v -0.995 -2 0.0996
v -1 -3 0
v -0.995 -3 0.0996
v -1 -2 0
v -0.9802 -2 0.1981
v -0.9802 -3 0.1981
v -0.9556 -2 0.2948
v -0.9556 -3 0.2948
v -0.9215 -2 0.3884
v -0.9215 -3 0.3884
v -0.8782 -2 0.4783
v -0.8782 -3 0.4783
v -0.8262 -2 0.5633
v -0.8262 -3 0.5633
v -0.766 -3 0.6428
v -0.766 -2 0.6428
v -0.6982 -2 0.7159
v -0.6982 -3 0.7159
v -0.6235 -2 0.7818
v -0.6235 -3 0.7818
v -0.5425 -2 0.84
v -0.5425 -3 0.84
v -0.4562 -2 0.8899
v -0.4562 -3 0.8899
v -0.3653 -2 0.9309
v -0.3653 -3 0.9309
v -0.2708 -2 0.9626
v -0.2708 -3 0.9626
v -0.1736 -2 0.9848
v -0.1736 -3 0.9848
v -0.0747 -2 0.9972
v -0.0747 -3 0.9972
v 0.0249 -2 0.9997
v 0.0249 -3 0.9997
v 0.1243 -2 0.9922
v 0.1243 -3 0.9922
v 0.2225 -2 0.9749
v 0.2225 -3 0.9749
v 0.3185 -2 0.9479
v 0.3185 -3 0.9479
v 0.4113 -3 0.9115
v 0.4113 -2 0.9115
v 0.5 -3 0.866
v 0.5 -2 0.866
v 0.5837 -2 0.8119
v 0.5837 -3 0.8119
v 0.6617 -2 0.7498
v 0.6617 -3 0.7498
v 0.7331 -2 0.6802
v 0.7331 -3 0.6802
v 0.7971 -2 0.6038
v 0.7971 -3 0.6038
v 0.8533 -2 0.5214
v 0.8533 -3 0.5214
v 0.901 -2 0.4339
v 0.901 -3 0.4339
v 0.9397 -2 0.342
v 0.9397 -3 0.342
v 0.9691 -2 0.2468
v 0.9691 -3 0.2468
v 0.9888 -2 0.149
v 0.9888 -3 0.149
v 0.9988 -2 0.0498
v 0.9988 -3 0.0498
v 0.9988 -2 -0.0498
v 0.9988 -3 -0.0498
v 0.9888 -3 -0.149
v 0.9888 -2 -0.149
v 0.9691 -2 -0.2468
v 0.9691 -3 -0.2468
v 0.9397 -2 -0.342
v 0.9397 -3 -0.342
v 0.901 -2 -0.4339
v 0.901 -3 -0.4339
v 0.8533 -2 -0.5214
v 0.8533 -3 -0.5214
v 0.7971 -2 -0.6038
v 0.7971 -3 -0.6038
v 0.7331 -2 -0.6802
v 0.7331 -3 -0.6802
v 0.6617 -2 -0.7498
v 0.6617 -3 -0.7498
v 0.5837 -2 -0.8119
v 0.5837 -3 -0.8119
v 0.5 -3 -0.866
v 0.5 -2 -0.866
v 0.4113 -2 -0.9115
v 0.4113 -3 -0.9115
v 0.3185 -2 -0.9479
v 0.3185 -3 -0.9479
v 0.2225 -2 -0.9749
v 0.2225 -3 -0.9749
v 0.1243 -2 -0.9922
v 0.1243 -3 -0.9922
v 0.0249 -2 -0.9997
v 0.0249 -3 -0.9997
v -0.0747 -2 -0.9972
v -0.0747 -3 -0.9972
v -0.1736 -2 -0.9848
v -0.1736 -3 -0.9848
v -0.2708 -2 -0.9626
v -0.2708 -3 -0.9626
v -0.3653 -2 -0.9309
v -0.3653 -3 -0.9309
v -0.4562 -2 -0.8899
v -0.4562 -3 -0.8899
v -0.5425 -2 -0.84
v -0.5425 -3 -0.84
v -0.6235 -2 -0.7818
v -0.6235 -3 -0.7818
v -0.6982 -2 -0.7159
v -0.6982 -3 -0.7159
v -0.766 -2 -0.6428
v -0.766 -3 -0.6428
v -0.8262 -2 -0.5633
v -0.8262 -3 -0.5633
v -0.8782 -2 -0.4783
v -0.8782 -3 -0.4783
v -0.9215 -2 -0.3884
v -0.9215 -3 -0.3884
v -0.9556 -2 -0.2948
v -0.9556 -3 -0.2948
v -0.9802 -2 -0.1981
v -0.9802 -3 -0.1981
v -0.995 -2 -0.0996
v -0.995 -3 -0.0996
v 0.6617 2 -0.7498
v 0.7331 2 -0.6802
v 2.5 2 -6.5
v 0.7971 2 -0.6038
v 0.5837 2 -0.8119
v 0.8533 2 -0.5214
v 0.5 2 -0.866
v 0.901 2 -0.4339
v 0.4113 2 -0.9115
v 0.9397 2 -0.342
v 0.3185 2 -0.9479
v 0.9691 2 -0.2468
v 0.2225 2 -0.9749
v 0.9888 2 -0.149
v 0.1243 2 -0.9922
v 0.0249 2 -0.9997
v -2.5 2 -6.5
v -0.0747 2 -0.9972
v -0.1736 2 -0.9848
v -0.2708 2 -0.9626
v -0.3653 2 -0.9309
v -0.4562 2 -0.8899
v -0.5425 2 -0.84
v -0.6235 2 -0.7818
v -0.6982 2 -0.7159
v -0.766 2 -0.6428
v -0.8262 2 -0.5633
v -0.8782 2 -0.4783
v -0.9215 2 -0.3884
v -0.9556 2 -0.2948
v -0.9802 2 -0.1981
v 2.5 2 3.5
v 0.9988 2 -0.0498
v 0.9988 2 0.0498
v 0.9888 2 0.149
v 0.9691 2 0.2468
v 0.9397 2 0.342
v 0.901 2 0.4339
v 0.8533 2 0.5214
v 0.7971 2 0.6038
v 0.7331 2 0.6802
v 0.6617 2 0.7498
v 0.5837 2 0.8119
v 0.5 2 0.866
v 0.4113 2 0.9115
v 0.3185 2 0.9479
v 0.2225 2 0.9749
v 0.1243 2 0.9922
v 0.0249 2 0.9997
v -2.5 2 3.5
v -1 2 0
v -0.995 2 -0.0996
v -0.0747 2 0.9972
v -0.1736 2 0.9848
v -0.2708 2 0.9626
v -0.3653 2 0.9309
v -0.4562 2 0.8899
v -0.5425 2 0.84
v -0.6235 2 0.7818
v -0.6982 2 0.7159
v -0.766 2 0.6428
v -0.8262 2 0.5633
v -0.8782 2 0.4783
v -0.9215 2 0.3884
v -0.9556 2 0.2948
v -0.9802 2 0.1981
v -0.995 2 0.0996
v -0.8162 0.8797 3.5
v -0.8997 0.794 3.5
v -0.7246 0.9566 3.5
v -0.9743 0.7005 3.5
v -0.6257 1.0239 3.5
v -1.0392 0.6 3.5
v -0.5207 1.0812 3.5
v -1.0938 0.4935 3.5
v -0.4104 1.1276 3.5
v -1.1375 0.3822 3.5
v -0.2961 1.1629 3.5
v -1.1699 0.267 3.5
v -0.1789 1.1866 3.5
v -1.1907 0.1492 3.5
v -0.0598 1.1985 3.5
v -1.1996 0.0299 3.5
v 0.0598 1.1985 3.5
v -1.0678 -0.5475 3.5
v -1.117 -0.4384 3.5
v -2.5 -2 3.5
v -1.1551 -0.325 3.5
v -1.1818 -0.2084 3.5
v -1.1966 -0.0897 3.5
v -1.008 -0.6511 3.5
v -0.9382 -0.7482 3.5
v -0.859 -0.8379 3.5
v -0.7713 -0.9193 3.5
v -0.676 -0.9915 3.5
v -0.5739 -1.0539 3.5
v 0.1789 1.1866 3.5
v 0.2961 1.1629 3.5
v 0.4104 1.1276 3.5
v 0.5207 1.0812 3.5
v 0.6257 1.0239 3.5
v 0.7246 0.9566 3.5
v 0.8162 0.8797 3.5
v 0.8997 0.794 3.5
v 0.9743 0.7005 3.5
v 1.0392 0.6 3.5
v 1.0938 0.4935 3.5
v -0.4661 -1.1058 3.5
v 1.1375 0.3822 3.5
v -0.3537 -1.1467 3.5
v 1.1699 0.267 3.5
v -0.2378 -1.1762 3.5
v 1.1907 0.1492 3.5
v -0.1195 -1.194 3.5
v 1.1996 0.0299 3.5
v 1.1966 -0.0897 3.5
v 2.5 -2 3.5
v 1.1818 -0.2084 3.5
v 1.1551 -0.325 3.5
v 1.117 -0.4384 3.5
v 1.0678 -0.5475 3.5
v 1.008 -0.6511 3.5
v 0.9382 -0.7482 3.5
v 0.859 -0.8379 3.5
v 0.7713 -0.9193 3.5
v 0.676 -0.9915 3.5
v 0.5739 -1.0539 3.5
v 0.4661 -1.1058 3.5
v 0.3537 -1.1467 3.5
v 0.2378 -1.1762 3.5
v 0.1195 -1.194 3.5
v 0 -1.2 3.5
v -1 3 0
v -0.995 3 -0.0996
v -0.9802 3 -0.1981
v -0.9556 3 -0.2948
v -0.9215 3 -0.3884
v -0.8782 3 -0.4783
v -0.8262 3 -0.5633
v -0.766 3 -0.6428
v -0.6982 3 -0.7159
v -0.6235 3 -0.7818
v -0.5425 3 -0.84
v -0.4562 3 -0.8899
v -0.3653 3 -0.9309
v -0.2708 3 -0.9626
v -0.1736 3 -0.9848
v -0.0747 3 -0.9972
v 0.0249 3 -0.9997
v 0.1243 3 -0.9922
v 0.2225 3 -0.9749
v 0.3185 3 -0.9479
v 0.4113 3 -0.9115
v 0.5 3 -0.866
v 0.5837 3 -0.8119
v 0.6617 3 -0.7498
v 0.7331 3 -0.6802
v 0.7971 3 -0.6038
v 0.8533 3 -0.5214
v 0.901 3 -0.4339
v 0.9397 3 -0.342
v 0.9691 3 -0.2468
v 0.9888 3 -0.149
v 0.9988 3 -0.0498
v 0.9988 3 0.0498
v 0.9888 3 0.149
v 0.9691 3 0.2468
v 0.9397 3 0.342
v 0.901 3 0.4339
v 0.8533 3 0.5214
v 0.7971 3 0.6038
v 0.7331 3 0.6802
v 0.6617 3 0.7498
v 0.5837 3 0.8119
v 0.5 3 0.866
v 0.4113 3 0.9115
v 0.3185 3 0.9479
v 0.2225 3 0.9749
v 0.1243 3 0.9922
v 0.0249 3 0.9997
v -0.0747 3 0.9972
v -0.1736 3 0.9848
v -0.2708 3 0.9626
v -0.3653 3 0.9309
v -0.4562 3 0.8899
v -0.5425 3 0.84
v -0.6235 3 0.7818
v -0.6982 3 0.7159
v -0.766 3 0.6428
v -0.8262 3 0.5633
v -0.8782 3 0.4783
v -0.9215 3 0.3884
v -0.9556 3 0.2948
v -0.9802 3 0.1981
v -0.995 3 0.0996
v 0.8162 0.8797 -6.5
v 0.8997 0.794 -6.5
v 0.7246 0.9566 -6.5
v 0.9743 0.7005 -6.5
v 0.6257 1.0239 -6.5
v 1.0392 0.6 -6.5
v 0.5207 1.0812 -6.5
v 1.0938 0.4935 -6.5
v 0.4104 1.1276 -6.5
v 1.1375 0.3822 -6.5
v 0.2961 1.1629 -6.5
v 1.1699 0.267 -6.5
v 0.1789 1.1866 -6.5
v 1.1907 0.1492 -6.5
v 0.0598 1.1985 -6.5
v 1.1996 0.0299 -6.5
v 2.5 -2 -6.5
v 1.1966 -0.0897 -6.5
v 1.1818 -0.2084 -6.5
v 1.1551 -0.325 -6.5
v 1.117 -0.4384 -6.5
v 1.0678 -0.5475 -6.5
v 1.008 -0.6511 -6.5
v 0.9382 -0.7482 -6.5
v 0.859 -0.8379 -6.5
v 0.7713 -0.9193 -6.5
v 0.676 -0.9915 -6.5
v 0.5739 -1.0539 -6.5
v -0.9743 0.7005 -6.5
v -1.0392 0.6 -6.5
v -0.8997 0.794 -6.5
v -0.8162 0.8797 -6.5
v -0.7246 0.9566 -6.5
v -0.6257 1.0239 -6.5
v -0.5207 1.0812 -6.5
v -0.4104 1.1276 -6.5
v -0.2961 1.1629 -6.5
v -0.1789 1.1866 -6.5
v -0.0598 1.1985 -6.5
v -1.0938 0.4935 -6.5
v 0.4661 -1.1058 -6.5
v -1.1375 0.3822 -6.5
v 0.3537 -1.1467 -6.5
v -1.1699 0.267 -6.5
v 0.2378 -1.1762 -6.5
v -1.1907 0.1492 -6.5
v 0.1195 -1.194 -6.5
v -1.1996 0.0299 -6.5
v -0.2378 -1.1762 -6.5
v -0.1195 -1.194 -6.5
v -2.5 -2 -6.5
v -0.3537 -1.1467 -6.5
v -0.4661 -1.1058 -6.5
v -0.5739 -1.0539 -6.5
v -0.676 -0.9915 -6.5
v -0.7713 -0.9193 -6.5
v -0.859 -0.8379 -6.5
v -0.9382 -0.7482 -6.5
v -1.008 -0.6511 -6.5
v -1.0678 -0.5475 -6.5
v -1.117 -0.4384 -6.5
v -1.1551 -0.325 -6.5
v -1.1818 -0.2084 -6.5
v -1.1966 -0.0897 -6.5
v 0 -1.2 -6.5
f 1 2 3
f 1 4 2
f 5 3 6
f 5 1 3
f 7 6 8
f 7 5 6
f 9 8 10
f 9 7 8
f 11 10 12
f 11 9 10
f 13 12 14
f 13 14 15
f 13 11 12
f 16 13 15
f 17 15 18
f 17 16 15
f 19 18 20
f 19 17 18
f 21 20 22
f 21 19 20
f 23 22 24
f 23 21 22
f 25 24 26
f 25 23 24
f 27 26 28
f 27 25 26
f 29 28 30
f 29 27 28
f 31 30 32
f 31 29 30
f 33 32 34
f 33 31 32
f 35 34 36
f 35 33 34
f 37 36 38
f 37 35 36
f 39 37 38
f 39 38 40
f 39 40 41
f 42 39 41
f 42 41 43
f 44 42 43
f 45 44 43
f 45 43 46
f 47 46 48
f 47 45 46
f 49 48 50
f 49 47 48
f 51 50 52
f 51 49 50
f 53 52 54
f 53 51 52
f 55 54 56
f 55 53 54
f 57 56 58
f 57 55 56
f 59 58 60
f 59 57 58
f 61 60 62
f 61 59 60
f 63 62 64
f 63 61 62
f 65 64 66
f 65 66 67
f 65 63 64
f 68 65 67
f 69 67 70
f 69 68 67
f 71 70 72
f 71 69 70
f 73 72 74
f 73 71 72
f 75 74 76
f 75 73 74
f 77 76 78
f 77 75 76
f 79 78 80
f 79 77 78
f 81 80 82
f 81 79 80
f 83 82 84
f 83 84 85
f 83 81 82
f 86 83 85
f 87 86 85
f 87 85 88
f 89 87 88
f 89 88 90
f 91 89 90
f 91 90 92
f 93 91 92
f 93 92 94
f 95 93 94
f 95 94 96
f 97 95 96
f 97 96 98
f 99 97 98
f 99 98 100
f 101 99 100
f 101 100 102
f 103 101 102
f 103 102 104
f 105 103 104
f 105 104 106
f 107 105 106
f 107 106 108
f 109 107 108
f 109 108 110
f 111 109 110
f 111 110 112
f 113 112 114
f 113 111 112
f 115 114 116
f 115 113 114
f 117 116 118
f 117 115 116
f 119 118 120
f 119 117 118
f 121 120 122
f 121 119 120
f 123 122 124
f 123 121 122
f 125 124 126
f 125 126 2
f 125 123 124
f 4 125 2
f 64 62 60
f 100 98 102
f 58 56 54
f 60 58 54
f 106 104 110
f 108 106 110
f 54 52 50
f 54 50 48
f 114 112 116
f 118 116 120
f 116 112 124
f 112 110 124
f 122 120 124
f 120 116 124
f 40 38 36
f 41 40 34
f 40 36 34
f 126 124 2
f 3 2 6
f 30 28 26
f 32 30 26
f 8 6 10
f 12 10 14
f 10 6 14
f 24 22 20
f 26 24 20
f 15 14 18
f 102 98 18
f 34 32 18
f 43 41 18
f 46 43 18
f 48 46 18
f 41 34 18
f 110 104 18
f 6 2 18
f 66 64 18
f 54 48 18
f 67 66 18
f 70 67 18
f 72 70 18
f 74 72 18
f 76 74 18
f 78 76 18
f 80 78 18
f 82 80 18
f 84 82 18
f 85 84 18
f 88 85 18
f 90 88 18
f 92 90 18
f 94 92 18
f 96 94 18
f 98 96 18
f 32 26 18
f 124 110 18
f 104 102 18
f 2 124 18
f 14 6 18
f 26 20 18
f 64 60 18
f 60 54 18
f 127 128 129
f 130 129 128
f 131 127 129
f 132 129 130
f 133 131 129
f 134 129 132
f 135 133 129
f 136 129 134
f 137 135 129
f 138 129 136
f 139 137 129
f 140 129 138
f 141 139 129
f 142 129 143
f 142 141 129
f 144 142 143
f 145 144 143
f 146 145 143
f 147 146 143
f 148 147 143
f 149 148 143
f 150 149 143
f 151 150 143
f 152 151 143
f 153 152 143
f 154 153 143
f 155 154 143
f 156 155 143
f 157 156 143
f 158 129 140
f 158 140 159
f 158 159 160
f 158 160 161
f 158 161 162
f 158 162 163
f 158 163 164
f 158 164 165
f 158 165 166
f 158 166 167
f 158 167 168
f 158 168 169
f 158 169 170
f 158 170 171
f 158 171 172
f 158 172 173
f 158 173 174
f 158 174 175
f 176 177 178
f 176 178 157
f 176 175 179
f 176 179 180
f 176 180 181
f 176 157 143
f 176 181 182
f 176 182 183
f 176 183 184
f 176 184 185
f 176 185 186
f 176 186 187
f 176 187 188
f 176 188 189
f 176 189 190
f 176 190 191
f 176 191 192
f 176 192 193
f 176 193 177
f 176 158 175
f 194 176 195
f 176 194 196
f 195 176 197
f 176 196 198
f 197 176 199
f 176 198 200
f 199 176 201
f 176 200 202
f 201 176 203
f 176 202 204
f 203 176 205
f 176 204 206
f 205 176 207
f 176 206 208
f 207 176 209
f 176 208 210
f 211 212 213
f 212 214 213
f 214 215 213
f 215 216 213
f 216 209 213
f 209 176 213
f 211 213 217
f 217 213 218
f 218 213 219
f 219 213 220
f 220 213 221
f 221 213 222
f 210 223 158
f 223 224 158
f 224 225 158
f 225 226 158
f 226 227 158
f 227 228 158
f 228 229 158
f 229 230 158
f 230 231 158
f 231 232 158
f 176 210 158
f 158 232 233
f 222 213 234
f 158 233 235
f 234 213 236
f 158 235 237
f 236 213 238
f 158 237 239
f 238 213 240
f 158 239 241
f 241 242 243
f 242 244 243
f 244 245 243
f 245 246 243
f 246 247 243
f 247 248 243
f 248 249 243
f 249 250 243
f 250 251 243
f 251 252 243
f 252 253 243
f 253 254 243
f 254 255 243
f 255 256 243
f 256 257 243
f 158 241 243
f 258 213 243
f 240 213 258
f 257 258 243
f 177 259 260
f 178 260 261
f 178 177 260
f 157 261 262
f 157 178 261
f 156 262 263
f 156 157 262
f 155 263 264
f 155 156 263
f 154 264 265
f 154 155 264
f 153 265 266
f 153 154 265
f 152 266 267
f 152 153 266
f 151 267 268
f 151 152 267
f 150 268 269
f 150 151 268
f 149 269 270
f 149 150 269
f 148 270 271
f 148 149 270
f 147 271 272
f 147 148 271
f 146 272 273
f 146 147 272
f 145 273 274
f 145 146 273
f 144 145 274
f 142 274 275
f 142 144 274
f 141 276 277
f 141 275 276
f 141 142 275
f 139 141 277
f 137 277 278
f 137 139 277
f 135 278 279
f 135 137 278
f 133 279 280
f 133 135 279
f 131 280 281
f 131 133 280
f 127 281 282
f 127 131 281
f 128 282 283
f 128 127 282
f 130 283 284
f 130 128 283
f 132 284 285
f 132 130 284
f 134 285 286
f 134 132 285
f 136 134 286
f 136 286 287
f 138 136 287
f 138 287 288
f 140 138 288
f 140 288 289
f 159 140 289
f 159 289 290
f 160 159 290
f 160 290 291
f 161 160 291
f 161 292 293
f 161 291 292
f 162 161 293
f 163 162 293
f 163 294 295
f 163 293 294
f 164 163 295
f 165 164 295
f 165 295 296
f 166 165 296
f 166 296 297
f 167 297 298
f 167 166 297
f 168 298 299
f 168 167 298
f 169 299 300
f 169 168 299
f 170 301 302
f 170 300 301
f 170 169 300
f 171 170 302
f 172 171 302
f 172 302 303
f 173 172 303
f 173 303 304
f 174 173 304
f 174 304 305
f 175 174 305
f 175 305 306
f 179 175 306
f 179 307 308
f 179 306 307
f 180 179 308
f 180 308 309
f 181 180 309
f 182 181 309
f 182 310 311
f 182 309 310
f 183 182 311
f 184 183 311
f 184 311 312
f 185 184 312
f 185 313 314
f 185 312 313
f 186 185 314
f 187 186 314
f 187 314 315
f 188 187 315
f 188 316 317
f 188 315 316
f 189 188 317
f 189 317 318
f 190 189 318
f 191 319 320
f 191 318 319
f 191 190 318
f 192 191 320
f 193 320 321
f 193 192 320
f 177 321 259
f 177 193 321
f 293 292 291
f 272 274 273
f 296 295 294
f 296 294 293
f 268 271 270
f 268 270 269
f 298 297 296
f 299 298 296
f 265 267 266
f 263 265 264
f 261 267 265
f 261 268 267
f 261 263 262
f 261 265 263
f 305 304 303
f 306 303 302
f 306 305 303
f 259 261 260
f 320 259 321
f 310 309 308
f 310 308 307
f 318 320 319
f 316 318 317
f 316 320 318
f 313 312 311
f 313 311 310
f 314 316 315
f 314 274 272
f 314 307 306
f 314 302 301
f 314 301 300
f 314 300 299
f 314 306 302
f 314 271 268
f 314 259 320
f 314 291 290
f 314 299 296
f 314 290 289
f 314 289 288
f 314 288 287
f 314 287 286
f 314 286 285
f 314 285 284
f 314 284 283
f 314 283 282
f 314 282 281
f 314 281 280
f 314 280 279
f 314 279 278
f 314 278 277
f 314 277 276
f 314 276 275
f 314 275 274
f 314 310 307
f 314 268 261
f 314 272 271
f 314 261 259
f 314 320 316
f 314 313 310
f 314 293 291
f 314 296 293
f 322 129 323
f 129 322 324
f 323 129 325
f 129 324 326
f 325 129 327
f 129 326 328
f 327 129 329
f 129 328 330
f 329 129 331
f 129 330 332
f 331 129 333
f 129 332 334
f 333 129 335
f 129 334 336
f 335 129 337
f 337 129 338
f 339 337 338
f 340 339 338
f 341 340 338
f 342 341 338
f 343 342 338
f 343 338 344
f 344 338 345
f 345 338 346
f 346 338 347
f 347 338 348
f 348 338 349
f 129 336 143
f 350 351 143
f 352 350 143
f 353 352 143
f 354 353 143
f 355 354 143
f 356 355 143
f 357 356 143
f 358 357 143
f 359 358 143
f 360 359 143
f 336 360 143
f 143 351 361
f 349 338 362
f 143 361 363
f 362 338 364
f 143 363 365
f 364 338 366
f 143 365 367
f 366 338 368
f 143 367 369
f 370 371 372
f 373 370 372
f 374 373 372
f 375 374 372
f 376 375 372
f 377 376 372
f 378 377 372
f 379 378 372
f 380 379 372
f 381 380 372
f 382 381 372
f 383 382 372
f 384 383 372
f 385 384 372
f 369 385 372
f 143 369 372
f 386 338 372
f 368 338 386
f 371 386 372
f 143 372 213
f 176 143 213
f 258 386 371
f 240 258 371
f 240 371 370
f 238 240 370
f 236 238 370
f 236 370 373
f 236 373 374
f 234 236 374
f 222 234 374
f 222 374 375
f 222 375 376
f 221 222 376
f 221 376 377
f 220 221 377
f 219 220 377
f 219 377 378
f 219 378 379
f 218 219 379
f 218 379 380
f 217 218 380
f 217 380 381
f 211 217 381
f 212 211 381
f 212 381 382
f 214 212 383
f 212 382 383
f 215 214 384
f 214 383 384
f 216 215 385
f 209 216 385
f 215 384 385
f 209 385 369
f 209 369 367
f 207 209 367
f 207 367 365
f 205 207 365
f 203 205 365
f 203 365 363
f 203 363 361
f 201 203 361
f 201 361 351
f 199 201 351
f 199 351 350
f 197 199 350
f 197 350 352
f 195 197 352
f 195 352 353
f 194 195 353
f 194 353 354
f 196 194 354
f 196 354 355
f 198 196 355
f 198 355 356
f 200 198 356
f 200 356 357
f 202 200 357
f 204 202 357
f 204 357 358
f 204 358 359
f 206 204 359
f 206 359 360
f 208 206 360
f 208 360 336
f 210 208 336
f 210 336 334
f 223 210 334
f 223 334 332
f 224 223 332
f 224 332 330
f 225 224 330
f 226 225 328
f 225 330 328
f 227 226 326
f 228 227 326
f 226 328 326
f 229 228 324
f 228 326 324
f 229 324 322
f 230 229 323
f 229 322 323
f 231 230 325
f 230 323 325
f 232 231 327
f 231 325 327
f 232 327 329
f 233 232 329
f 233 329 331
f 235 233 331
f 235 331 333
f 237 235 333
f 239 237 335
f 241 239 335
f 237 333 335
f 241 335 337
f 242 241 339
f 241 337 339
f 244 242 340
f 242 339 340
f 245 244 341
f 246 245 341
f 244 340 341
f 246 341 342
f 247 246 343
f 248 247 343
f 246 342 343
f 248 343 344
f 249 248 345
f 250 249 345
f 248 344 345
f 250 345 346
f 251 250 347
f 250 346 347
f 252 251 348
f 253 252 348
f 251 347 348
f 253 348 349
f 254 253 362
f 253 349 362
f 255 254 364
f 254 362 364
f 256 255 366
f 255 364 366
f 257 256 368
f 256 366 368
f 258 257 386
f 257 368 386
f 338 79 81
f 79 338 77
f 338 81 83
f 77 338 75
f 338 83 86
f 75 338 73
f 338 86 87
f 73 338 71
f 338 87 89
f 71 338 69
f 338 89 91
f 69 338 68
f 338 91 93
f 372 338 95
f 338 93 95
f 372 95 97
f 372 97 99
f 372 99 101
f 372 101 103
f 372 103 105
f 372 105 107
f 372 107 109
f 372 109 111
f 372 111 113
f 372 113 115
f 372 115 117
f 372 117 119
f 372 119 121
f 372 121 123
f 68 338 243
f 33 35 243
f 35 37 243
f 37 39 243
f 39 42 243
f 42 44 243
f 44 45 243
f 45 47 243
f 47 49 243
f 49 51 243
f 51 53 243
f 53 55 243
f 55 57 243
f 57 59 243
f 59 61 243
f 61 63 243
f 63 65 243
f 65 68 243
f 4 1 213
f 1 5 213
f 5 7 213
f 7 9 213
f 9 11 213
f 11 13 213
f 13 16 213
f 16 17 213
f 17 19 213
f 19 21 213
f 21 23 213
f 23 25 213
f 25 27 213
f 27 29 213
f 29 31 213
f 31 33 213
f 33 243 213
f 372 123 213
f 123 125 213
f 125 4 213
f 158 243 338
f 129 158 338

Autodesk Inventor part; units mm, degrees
ref_plane "YZ Plane" through (0, 0, 0) normal (1, 0, 0) x (0, 1, 0)
ref_plane "XZ Plane" through (0, 0, 0) normal (0, 1, 0) x (-1, 0, 0)
ref_plane "XY Plane" through (0, 0, 0) normal (0, 0, 1) x (1, 0, 0)
sketch "スケッチ1" plane through (0, 0, 0) normal (0, 1, 0) x (-1, 0, 0)
  line L0 (2.5, 3.5) -> (-2.5, 3.5)
  line L1 (-2.5, 3.5) -> (-2.5, -6.5)
  line L2 (-2.5, -6.5) -> (2.5, -6.5)
  line L3 (2.5, -6.5) -> (2.5, 3.5)
  point P0 (0, 0)
  point P1 (0, 3.5)
  dimension "d0" = 5
  dimension "d15" = 10
  dimension "d46" = 3.5
extrude "押し出し1" add sketch "スケッチ1" along normal mid plane 4
sketch "スケッチ2" plane through (0, 0, 0) normal (0, 1, 0) x (-1, 0, 0)
  circle A0 centre (0, 0) radius 1
  dimension "d3" = 2
extrude "押し出し2" add sketch "スケッチ2" along normal mid plane 6
sketch "スケッチ9" plane through (-2.5, 2, 3.5) normal (0, 0, 1) x (1, 0, 0)
  point P0 (2.5, -2)
  point P1 (2.5, -2)
hole "穴4" at (0, 0, 3.5) direction (0, 0, -1) diameter 2.4 end through all
properties part number "gear_connecotr1_V2" material "ABS プラスチック"
